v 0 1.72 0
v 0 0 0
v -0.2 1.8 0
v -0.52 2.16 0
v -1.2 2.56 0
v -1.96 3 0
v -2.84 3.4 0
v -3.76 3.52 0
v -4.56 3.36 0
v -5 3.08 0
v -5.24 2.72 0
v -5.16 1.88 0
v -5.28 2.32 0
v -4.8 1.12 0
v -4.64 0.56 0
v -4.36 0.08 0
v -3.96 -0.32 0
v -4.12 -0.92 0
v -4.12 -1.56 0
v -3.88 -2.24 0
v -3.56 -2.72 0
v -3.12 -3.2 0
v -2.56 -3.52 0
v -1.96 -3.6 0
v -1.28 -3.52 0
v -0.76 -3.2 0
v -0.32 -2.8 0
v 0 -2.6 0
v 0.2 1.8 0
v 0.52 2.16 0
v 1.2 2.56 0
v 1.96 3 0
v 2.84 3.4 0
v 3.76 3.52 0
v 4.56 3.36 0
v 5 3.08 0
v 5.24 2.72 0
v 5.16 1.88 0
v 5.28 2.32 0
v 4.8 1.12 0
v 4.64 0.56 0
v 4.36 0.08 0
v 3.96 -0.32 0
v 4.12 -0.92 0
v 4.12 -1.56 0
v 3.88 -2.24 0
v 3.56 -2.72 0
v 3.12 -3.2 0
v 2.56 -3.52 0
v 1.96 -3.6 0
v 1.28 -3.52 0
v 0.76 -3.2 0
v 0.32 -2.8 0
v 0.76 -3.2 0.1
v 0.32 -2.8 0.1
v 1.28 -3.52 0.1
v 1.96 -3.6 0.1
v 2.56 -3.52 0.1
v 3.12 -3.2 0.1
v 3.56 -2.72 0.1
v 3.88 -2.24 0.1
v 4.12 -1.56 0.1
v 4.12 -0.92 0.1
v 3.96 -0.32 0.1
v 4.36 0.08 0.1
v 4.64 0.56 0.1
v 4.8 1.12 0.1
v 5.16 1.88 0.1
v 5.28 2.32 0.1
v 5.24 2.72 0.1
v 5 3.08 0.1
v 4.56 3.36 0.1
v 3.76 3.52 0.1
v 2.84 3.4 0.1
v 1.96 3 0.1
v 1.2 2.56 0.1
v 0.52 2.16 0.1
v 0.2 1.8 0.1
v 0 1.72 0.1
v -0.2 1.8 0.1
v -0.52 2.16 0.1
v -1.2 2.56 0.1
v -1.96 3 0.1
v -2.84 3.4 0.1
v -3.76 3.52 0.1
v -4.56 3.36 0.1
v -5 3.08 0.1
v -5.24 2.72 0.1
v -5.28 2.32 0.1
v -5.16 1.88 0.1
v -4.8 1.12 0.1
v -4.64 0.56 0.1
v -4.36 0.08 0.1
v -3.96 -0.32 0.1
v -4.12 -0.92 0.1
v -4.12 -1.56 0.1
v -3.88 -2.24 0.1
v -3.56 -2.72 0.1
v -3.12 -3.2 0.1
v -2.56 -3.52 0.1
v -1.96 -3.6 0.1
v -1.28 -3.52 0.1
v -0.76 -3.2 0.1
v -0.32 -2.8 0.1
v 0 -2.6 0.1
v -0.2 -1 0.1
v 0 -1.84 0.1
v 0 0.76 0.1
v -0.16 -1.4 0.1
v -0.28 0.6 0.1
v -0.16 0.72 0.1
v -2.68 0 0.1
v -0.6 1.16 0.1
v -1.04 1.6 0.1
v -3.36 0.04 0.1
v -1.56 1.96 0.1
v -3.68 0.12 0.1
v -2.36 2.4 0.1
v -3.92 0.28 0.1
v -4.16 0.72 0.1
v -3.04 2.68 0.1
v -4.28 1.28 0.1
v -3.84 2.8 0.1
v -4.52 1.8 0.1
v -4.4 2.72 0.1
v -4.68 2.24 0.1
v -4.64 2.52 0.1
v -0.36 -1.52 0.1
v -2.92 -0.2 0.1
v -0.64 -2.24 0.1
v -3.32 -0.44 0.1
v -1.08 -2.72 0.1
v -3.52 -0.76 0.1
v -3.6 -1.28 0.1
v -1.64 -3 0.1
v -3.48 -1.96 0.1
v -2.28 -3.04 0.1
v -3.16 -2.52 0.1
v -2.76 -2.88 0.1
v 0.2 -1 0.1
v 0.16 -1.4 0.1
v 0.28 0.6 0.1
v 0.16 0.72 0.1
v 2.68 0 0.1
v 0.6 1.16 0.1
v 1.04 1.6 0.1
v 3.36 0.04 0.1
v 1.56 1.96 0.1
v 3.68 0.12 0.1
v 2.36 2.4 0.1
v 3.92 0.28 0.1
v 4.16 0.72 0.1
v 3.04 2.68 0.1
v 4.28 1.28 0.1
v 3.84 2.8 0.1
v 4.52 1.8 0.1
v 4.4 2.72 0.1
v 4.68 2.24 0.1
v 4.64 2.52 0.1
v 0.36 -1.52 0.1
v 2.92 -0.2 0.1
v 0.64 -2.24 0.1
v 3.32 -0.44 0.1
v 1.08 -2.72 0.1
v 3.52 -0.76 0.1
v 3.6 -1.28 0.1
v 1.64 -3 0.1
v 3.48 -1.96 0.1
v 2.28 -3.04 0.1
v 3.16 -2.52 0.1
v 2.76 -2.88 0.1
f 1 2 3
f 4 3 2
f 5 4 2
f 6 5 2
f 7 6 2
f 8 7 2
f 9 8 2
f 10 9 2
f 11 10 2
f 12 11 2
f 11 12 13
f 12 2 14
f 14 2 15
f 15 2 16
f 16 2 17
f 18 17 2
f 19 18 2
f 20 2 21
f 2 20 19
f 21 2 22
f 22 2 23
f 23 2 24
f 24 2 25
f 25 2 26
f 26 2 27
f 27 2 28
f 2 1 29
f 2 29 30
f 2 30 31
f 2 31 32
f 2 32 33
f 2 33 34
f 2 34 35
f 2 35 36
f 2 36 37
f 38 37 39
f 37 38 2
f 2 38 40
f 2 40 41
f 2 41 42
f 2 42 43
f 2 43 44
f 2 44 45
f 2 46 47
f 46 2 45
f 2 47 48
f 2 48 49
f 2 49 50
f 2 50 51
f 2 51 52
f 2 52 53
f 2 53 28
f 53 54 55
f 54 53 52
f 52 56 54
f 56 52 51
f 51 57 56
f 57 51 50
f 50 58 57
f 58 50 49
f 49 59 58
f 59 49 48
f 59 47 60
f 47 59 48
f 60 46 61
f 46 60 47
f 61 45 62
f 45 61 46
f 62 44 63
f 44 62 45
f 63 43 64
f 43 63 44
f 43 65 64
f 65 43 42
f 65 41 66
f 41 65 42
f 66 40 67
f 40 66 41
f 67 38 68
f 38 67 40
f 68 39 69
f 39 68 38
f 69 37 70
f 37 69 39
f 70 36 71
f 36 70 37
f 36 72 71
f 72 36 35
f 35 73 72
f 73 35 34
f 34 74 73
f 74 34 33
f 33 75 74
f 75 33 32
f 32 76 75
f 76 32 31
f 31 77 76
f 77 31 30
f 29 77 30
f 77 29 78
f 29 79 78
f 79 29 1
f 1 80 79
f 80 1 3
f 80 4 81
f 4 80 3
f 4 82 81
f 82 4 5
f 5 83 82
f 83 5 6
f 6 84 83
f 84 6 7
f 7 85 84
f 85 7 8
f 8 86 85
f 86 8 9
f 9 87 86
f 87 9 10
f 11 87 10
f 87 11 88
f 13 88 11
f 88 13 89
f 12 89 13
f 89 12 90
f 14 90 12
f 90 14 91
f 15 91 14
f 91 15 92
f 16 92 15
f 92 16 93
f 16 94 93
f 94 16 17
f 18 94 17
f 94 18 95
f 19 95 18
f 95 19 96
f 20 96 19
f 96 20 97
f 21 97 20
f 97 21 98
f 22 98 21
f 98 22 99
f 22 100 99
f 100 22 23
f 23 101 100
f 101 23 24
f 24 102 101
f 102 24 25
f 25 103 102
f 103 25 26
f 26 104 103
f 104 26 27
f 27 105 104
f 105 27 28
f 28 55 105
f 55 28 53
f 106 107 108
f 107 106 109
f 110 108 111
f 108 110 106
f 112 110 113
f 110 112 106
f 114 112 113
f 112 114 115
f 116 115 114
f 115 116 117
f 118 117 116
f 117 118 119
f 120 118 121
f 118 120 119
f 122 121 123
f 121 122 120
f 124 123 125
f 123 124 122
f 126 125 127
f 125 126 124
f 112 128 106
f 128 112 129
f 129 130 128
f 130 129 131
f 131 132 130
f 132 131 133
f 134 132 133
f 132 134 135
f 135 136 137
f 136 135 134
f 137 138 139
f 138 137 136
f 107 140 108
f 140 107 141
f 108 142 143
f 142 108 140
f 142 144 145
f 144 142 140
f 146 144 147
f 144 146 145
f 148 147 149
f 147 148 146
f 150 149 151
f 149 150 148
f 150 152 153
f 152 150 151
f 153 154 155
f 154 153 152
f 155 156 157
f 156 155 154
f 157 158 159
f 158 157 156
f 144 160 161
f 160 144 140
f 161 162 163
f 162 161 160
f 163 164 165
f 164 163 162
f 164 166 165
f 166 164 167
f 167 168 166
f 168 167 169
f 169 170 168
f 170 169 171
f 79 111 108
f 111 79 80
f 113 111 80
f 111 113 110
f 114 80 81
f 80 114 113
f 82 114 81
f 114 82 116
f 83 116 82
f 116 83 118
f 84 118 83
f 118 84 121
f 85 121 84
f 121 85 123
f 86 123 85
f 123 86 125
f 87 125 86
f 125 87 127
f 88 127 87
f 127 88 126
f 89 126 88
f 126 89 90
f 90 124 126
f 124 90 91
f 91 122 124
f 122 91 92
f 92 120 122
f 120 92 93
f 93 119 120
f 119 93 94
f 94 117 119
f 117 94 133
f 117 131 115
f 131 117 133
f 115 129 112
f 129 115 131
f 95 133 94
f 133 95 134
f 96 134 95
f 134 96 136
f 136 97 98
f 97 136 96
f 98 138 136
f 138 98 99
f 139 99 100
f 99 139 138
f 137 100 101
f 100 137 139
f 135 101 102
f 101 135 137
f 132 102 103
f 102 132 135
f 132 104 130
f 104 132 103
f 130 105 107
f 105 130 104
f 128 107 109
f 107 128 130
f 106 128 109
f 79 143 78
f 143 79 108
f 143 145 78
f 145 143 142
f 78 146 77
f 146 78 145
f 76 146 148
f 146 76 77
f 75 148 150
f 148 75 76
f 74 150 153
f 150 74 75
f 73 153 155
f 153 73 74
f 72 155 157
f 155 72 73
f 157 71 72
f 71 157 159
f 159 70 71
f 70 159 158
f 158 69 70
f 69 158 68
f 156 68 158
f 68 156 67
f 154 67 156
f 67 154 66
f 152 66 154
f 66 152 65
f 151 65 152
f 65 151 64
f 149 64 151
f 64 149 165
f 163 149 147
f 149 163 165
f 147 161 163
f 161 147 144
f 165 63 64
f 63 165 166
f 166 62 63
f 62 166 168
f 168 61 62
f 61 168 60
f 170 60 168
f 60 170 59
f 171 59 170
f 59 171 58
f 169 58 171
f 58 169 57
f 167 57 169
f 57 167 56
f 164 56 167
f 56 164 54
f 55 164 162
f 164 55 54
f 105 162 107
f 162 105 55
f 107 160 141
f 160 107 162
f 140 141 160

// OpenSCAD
// file: s/4650854is02.scad
use <../../lib.scad>
function ldraw_lib__s__4650854is02() = [
// 0 ~Sticker  0.9 x  1.3 with Butterfly - Shape
// 0 Name: s\4650854is02.dat
// 0 Author: Takeshi Takahashi [RainbowDolphin]
// 0 !LDRAW_ORG Subpart UPDATE 2024-04
// 0 !LICENSE Licensed under CC BY 4.0 : see CAreadme.txt
// 
// 0 BFC CERTIFY CCW
  [0,"BFC","CERTIFY"],
  [0,"BFC","CCW"],
// 
// 0 !HISTORY 2024-05-28 [OrionP] Official Update 2024-04
// 
// 
// 4 16 -.5 -.25 -2.5 -.4 -.25 -3.5 0 -.25 -4.6 0 -.25 1.9
  [4,16,-.5,-.25,-2.5,-.4,-.25,-3.5,0,-.25,-4.6,0,-.25,1.9],
// 4 16 -.5 -.25 -2.5 0 -.25 1.9 -.4 -.25 1.8 -.7 -.25 1.5
  [4,16,-.5,-.25,-2.5,0,-.25,1.9,-.4,-.25,1.8,-.7,-.25,1.5],
// 4 16 -6.7 -.25 0 -.5 -.25 -2.5 -.7 -.25 1.5 -1.5 -.25 2.9
  [4,16,-6.7,-.25,0,-.5,-.25,-2.5,-.7,-.25,1.5,-1.5,-.25,2.9],
// 4 16 -8.4 -.25 .1 -6.7 -.25 0 -1.5 -.25 2.9 -2.6 -.25 4
  [4,16,-8.4,-.25,.1,-6.7,-.25,0,-1.5,-.25,2.9,-2.6,-.25,4],
// 4 16 -9.2 -.25 .3 -8.4 -.25 .1 -2.6 -.25 4 -3.9 -.25 4.9
  [4,16,-9.2,-.25,.3,-8.4,-.25,.1,-2.6,-.25,4,-3.9,-.25,4.9],
// 4 16 -9.8 -.25 .7 -9.2 -.25 .3 -3.9 -.25 4.9 -5.9 -.25 6
  [4,16,-9.8,-.25,.7,-9.2,-.25,.3,-3.9,-.25,4.9,-5.9,-.25,6],
// 4 16 -10.4 -.25 1.8 -9.8 -.25 .7 -5.9 -.25 6 -7.6 -.25 6.7
  [4,16,-10.4,-.25,1.8,-9.8,-.25,.7,-5.9,-.25,6,-7.6,-.25,6.7],
// 4 16 -10.7 -.25 3.2 -10.4 -.25 1.8 -7.6 -.25 6.7 -9.6 -.25 7
  [4,16,-10.7,-.25,3.2,-10.4,-.25,1.8,-7.6,-.25,6.7,-9.6,-.25,7],
// 4 16 -11.3 -.25 4.5 -10.7 -.25 3.2 -9.6 -.25 7 -11 -.25 6.8
  [4,16,-11.3,-.25,4.5,-10.7,-.25,3.2,-9.6,-.25,7,-11,-.25,6.8],
// 4 16 -11.7 -.25 5.6 -11.3 -.25 4.5 -11 -.25 6.8 -11.6 -.25 6.3
  [4,16,-11.7,-.25,5.6,-11.3,-.25,4.5,-11,-.25,6.8,-11.6,-.25,6.3],
// 4 16 -.5 -.25 -2.5 -6.7 -.25 0 -7.3 -.25 -.5 -.9 -.25 -3.8
  [4,16,-.5,-.25,-2.5,-6.7,-.25,0,-7.3,-.25,-.5,-.9,-.25,-3.8],
// 4 16 -.9 -.25 -3.8 -7.3 -.25 -.5 -8.3 -.25 -1.1 -1.6 -.25 -5.6
  [4,16,-.9,-.25,-3.8,-7.3,-.25,-.5,-8.3,-.25,-1.1,-1.6,-.25,-5.6],
// 4 16 -1.6 -.25 -5.6 -8.3 -.25 -1.1 -8.8 -.25 -1.9 -2.7 -.25 -6.8
  [4,16,-1.6,-.25,-5.6,-8.3,-.25,-1.1,-8.8,-.25,-1.9,-2.7,-.25,-6.8],
// 4 16 -2.7 -.25 -6.8 -8.8 -.25 -1.9 -9 -.25 -3.2 -4.1 -.25 -7.5
  [4,16,-2.7,-.25,-6.8,-8.8,-.25,-1.9,-9,-.25,-3.2,-4.1,-.25,-7.5],
// 4 16 -4.1 -.25 -7.5 -9 -.25 -3.2 -8.7 -.25 -4.9 -5.7 -.25 -7.6
  [4,16,-4.1,-.25,-7.5,-9,-.25,-3.2,-8.7,-.25,-4.9,-5.7,-.25,-7.6],
// 4 16 -5.7 -.25 -7.6 -8.7 -.25 -4.9 -7.9 -.25 -6.3 -6.9 -.25 -7.2
  [4,16,-5.7,-.25,-7.6,-8.7,-.25,-4.9,-7.9,-.25,-6.3,-6.9,-.25,-7.2],
// 4 16 0 -.25 -4.6 .4 -.25 -3.5 .5 -.25 -2.5 0 -.25 1.9
  [4,16,0,-.25,-4.6,.4,-.25,-3.5,.5,-.25,-2.5,0,-.25,1.9],
// 4 16 .4 -.25 1.8 0 -.25 1.9 .5 -.25 -2.5 .7 -.25 1.5
  [4,16,.4,-.25,1.8,0,-.25,1.9,.5,-.25,-2.5,.7,-.25,1.5],
// 4 16 .7 -.25 1.5 .5 -.25 -2.5 6.7 -.25 0 1.5 -.25 2.9
  [4,16,.7,-.25,1.5,.5,-.25,-2.5,6.7,-.25,0,1.5,-.25,2.9],
// 4 16 1.5 -.25 2.9 6.7 -.25 0 8.4 -.25 .1 2.6 -.25 4
  [4,16,1.5,-.25,2.9,6.7,-.25,0,8.4,-.25,.1,2.6,-.25,4],
// 4 16 2.6 -.25 4 8.4 -.25 .1 9.2 -.25 .3 3.9 -.25 4.9
  [4,16,2.6,-.25,4,8.4,-.25,.1,9.2,-.25,.3,3.9,-.25,4.9],
// 4 16 3.9 -.25 4.9 9.2 -.25 .3 9.8 -.25 .7 5.9 -.25 6
  [4,16,3.9,-.25,4.9,9.2,-.25,.3,9.8,-.25,.7,5.9,-.25,6],
// 4 16 5.9 -.25 6 9.8 -.25 .7 10.4 -.25 1.8 7.6 -.25 6.7
  [4,16,5.9,-.25,6,9.8,-.25,.7,10.4,-.25,1.8,7.6,-.25,6.7],
// 4 16 7.6 -.25 6.7 10.4 -.25 1.8 10.7 -.25 3.2 9.6 -.25 7
  [4,16,7.6,-.25,6.7,10.4,-.25,1.8,10.7,-.25,3.2,9.6,-.25,7],
// 4 16 9.6 -.25 7 10.7 -.25 3.2 11.3 -.25 4.5 11 -.25 6.8
  [4,16,9.6,-.25,7,10.7,-.25,3.2,11.3,-.25,4.5,11,-.25,6.8],
// 4 16 11 -.25 6.8 11.3 -.25 4.5 11.7 -.25 5.6 11.6 -.25 6.3
  [4,16,11,-.25,6.8,11.3,-.25,4.5,11.7,-.25,5.6,11.6,-.25,6.3],
// 4 16 7.3 -.25 -.5 6.7 -.25 0 .5 -.25 -2.5 .9 -.25 -3.8
  [4,16,7.3,-.25,-.5,6.7,-.25,0,.5,-.25,-2.5,.9,-.25,-3.8],
// 4 16 8.3 -.25 -1.1 7.3 -.25 -.5 .9 -.25 -3.8 1.6 -.25 -5.6
  [4,16,8.3,-.25,-1.1,7.3,-.25,-.5,.9,-.25,-3.8,1.6,-.25,-5.6],
// 4 16 8.8 -.25 -1.9 8.3 -.25 -1.1 1.6 -.25 -5.6 2.7 -.25 -6.8
  [4,16,8.8,-.25,-1.9,8.3,-.25,-1.1,1.6,-.25,-5.6,2.7,-.25,-6.8],
// 4 16 9 -.25 -3.2 8.8 -.25 -1.9 2.7 -.25 -6.8 4.1 -.25 -7.5
  [4,16,9,-.25,-3.2,8.8,-.25,-1.9,2.7,-.25,-6.8,4.1,-.25,-7.5],
// 4 16 8.7 -.25 -4.9 9 -.25 -3.2 4.1 -.25 -7.5 5.7 -.25 -7.6
  [4,16,8.7,-.25,-4.9,9,-.25,-3.2,4.1,-.25,-7.5,5.7,-.25,-7.6],
// 4 16 7.9 -.25 -6.3 8.7 -.25 -4.9 5.7 -.25 -7.6 6.9 -.25 -7.2
  [4,16,7.9,-.25,-6.3,8.7,-.25,-4.9,5.7,-.25,-7.6,6.9,-.25,-7.2],
];
module ldraw_lib__s__4650854is02(step=0, col=false, unit=2/5, alt=false, line=0.2, solid=!$preview)
    makepoly(ldraw_lib__s__4650854is02(), step=step, col=col, unit=unit, alt=alt, line=line, solid=solid);
ldraw_lib__s__4650854is02(line=0.2);
// main file
use <../lib.scad>
use <s/4650854is01.scad>
use <s/4650854is02.scad>
use <s/4650854is03.scad>
function ldraw_lib__4620859j() = [
// 0 Sticker  0.9 x  1.3 with Dark Pink Butterfly
// 0 Name: 4620859j.dat
// 0 Author: Takeshi Takahashi [RainbowDolphin]
// 0 !LDRAW_ORG Part UPDATE 2024-04
// 0 !LICENSE Licensed under CC BY 4.0 : see CAreadme.txt
// 
// 0 BFC CERTIFY CCW
  [0,"BFC","CERTIFY"],
  [0,"BFC","CCW"],
// 
// 0 !KEYWORDS Set 3189, Stable
// 
// 0 !HISTORY 2024-05-28 [OrionP] Official Update 2024-04
// 
// 
// 1 16 0 0 0 1 0 0 0 1 0 0 0 1 s\4650854is01.dat
  [1,16,0,0,0,1,0,0,0,1,0,0,0,1, ldraw_lib__s__4650854is01()],
// 1 5 0 0 0 1 0 0 0 1 0 0 0 1 s\4650854is02.dat
  [1,5,0,0,0,1,0,0,0,1,0,0,0,1, ldraw_lib__s__4650854is02()],
// 1 19 0 0 0 1 0 0 0 1 0 0 0 1 s\4650854is03.dat
  [1,19,0,0,0,1,0,0,0,1,0,0,0,1, ldraw_lib__s__4650854is03()],
];
module ldraw_lib__4620859j(step=0, col=false, unit=2/5, alt=false, line=0.2, solid=!$preview)
    makepoly(ldraw_lib__4620859j(), step=step, col=col, unit=unit, alt=alt, line=line, solid=solid);
ldraw_lib__4620859j(line=0.2);
